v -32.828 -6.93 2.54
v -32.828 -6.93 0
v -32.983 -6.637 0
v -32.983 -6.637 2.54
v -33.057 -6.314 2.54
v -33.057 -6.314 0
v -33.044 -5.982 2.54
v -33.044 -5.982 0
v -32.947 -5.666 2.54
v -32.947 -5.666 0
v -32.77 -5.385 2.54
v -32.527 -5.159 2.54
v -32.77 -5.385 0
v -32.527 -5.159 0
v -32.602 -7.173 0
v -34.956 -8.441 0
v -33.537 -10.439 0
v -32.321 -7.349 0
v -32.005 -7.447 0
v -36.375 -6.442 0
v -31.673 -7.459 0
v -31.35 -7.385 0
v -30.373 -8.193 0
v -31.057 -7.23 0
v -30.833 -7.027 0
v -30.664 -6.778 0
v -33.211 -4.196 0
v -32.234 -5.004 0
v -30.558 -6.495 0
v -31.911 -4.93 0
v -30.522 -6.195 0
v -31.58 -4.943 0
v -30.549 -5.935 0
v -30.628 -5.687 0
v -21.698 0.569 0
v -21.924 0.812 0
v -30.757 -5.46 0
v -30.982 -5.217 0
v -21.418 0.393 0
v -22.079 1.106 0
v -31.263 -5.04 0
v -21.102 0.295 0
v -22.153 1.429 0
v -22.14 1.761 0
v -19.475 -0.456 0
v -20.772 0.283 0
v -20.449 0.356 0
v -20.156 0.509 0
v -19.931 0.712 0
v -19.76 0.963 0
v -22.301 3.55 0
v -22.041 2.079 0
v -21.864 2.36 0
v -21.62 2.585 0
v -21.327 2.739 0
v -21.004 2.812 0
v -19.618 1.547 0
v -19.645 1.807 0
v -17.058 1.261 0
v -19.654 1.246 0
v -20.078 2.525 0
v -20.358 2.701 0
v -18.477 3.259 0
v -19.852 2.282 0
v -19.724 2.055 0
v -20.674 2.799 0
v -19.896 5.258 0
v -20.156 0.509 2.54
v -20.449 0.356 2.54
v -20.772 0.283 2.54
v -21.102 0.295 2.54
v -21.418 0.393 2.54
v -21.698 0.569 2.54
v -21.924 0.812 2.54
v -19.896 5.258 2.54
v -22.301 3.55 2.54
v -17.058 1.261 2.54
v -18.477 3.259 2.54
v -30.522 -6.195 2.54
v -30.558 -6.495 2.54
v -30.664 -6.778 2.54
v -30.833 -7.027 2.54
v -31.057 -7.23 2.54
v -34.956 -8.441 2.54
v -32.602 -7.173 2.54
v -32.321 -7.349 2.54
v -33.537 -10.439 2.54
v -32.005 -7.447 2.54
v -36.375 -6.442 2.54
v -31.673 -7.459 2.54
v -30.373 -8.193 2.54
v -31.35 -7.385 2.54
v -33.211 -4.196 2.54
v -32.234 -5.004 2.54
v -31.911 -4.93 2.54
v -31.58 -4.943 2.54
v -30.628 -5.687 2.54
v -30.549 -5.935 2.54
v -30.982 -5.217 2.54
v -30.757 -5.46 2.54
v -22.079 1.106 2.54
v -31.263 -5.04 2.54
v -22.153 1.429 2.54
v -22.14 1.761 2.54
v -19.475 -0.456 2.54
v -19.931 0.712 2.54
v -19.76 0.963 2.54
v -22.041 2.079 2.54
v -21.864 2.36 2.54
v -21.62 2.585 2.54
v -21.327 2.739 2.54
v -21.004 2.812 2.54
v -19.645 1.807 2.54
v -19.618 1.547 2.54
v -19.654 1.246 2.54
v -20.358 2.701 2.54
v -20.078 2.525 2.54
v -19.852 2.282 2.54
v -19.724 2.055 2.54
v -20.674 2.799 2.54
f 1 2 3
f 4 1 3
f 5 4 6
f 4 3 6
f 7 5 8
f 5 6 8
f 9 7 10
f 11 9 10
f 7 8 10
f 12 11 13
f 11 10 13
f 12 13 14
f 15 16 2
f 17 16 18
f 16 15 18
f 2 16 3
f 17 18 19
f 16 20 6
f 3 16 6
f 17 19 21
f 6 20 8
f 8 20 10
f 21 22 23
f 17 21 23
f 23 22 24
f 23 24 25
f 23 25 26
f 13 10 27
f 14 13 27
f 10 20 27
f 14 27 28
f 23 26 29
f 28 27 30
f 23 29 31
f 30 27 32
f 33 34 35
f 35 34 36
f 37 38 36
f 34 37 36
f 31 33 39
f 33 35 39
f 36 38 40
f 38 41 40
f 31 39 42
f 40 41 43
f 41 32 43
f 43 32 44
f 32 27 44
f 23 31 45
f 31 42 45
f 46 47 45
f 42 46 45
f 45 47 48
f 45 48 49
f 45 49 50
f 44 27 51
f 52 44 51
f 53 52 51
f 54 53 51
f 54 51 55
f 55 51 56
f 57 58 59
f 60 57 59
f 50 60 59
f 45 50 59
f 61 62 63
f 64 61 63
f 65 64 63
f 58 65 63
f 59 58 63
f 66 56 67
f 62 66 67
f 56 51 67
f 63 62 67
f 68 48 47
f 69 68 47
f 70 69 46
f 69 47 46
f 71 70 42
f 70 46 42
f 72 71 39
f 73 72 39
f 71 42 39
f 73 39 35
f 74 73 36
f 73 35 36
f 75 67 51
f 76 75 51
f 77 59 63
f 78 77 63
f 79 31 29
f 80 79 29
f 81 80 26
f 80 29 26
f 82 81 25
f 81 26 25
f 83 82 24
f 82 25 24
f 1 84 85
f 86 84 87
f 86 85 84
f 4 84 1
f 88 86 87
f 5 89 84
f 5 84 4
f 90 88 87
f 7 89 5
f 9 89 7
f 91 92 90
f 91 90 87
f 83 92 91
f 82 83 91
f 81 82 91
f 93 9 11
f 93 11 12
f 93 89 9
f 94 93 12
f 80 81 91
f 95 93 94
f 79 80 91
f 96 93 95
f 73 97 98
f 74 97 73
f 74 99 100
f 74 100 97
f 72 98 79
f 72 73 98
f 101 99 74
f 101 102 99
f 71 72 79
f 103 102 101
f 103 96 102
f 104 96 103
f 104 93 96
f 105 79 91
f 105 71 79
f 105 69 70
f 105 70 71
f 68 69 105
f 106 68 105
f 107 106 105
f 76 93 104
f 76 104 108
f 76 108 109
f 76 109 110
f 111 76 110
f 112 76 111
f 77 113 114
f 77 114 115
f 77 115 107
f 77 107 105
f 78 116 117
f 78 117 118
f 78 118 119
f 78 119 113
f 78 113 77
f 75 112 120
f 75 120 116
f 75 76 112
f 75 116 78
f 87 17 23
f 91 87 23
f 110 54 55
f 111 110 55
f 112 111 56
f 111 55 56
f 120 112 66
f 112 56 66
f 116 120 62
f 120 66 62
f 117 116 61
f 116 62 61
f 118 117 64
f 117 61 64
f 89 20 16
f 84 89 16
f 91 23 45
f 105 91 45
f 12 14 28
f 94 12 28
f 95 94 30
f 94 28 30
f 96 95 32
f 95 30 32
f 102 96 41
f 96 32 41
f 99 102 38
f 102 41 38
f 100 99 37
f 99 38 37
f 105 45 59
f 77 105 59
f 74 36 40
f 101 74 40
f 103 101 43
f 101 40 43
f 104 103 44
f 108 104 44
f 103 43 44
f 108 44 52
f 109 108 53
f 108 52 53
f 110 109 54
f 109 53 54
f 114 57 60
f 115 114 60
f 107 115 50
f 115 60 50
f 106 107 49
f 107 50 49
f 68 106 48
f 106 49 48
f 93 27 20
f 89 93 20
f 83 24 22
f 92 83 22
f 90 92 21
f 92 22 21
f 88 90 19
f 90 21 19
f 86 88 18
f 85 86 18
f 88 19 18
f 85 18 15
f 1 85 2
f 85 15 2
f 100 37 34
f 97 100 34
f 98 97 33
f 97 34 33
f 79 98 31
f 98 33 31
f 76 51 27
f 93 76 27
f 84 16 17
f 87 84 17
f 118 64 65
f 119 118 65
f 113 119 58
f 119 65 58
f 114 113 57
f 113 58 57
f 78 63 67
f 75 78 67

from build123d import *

# Parameters (mm, degrees)
BOSS_EXTRUDE1_DEPTH = 2.54


with BuildPart() as part:
    # Sketch1 → Boss-Extrude1 (new body)
    with BuildSketch(Plane.XY):
        with BuildLine():
            Line((-19.895895452, 5.257641235), (-22.301043484, 3.549986133))
            Line((-22.301043484, 3.549986133), (-21.620166741, 2.584921984))
            ThreePointArc((-21.620166741, 2.584921984), (-20.673812198, 2.799001601), (-19.852490319, 2.282428882))
            Line((-19.852490319, 2.282428882), (-18.476919787, 3.25908396))
            Line((-18.476919787, 3.25908396), (-19.895895452, 5.257641235))
        make_face()
        with BuildLine():
            Line((-17.057944121, 1.260526684), (-18.476919787, 3.25908396))
            Line((-18.476919787, 3.25908396), (-19.852490319, 2.282428882))
            ThreePointArc((-19.852490319, 2.282428882), (-19.678061583, 1.933053448), (-19.618026709, 1.547198045))
            ThreePointArc((-19.618026709, 1.547198045), (-19.76048118, 0.962782884), (-20.155886678, 0.509474105))
            Line((-20.155886678, 0.509474105), (-19.475009935, -0.455590043))
            Line((-19.475009935, -0.455590043), (-17.057944121, 1.260526684))
        make_face()
        with BuildLine():
            Line((-21.9235631, 0.811967207), (-30.756728475, -5.459580209))
            ThreePointArc((-30.756728475, -5.459580209), (-30.582299739, -5.808955643), (-30.522264866, -6.194811046))
            ThreePointArc((-30.522264866, -6.194811046), (-30.663849348, -6.77754462), (-31.057034029, -7.230347437))
            Line((-31.057034029, -7.230347437), (-30.3732892, -8.193368322))
            Line((-30.3732892, -8.193368322), (-19.475009935, -0.455590043))
            Line((-19.475009935, -0.455590043), (-20.155886678, 0.509474105))
            ThreePointArc((-20.155886678, 0.509474105), (-21.102241221, 0.295394489), (-21.9235631, 0.811967207))
        make_face()
        with BuildLine():
            Line((-22.301043484, 3.549986133), (-33.211240531, -4.196253771))
            Line((-33.211240531, -4.196253771), (-32.527495703, -5.159274656))
            ThreePointArc((-32.527495703, -5.159274656), (-31.579916773, -4.942689532), (-30.756728475, -5.459580209))
            Line((-30.756728475, -5.459580209), (-21.9235631, 0.811967207))
            ThreePointArc((-21.9235631, 0.811967207), (-22.139830266, 1.761412556), (-21.620166741, 2.584921984))
            Line((-21.620166741, 2.584921984), (-22.301043484, 3.549986133))
        make_face()
        with BuildLine():
            Line((-33.211240531, -4.196253771), (-36.374783749, -6.442369456))
            Line((-36.374783749, -6.442369456), (-34.955808084, -8.440926731))
            Line((-34.955808084, -8.440926731), (-32.827801256, -6.930041884))
            ThreePointArc((-32.827801256, -6.930041884), (-33.04438638, -5.982462953), (-32.527495703, -5.159274656))
            Line((-32.527495703, -5.159274656), (-33.211240531, -4.196253771))
        make_face()
        with BuildLine():
            Line((-32.827801256, -6.930041884), (-34.955808084, -8.440926731))
            Line((-34.955808084, -8.440926731), (-33.536832418, -10.439484007))
            Line((-33.536832418, -10.439484007), (-30.3732892, -8.193368322))
            Line((-30.3732892, -8.193368322), (-31.057034029, -7.230347437))
            ThreePointArc((-31.057034029, -7.230347437), (-32.004612959, -7.446932561), (-32.827801256, -6.930041884))
        make_face()
    extrude(amount=BOSS_EXTRUDE1_DEPTH)


solid = part.part
